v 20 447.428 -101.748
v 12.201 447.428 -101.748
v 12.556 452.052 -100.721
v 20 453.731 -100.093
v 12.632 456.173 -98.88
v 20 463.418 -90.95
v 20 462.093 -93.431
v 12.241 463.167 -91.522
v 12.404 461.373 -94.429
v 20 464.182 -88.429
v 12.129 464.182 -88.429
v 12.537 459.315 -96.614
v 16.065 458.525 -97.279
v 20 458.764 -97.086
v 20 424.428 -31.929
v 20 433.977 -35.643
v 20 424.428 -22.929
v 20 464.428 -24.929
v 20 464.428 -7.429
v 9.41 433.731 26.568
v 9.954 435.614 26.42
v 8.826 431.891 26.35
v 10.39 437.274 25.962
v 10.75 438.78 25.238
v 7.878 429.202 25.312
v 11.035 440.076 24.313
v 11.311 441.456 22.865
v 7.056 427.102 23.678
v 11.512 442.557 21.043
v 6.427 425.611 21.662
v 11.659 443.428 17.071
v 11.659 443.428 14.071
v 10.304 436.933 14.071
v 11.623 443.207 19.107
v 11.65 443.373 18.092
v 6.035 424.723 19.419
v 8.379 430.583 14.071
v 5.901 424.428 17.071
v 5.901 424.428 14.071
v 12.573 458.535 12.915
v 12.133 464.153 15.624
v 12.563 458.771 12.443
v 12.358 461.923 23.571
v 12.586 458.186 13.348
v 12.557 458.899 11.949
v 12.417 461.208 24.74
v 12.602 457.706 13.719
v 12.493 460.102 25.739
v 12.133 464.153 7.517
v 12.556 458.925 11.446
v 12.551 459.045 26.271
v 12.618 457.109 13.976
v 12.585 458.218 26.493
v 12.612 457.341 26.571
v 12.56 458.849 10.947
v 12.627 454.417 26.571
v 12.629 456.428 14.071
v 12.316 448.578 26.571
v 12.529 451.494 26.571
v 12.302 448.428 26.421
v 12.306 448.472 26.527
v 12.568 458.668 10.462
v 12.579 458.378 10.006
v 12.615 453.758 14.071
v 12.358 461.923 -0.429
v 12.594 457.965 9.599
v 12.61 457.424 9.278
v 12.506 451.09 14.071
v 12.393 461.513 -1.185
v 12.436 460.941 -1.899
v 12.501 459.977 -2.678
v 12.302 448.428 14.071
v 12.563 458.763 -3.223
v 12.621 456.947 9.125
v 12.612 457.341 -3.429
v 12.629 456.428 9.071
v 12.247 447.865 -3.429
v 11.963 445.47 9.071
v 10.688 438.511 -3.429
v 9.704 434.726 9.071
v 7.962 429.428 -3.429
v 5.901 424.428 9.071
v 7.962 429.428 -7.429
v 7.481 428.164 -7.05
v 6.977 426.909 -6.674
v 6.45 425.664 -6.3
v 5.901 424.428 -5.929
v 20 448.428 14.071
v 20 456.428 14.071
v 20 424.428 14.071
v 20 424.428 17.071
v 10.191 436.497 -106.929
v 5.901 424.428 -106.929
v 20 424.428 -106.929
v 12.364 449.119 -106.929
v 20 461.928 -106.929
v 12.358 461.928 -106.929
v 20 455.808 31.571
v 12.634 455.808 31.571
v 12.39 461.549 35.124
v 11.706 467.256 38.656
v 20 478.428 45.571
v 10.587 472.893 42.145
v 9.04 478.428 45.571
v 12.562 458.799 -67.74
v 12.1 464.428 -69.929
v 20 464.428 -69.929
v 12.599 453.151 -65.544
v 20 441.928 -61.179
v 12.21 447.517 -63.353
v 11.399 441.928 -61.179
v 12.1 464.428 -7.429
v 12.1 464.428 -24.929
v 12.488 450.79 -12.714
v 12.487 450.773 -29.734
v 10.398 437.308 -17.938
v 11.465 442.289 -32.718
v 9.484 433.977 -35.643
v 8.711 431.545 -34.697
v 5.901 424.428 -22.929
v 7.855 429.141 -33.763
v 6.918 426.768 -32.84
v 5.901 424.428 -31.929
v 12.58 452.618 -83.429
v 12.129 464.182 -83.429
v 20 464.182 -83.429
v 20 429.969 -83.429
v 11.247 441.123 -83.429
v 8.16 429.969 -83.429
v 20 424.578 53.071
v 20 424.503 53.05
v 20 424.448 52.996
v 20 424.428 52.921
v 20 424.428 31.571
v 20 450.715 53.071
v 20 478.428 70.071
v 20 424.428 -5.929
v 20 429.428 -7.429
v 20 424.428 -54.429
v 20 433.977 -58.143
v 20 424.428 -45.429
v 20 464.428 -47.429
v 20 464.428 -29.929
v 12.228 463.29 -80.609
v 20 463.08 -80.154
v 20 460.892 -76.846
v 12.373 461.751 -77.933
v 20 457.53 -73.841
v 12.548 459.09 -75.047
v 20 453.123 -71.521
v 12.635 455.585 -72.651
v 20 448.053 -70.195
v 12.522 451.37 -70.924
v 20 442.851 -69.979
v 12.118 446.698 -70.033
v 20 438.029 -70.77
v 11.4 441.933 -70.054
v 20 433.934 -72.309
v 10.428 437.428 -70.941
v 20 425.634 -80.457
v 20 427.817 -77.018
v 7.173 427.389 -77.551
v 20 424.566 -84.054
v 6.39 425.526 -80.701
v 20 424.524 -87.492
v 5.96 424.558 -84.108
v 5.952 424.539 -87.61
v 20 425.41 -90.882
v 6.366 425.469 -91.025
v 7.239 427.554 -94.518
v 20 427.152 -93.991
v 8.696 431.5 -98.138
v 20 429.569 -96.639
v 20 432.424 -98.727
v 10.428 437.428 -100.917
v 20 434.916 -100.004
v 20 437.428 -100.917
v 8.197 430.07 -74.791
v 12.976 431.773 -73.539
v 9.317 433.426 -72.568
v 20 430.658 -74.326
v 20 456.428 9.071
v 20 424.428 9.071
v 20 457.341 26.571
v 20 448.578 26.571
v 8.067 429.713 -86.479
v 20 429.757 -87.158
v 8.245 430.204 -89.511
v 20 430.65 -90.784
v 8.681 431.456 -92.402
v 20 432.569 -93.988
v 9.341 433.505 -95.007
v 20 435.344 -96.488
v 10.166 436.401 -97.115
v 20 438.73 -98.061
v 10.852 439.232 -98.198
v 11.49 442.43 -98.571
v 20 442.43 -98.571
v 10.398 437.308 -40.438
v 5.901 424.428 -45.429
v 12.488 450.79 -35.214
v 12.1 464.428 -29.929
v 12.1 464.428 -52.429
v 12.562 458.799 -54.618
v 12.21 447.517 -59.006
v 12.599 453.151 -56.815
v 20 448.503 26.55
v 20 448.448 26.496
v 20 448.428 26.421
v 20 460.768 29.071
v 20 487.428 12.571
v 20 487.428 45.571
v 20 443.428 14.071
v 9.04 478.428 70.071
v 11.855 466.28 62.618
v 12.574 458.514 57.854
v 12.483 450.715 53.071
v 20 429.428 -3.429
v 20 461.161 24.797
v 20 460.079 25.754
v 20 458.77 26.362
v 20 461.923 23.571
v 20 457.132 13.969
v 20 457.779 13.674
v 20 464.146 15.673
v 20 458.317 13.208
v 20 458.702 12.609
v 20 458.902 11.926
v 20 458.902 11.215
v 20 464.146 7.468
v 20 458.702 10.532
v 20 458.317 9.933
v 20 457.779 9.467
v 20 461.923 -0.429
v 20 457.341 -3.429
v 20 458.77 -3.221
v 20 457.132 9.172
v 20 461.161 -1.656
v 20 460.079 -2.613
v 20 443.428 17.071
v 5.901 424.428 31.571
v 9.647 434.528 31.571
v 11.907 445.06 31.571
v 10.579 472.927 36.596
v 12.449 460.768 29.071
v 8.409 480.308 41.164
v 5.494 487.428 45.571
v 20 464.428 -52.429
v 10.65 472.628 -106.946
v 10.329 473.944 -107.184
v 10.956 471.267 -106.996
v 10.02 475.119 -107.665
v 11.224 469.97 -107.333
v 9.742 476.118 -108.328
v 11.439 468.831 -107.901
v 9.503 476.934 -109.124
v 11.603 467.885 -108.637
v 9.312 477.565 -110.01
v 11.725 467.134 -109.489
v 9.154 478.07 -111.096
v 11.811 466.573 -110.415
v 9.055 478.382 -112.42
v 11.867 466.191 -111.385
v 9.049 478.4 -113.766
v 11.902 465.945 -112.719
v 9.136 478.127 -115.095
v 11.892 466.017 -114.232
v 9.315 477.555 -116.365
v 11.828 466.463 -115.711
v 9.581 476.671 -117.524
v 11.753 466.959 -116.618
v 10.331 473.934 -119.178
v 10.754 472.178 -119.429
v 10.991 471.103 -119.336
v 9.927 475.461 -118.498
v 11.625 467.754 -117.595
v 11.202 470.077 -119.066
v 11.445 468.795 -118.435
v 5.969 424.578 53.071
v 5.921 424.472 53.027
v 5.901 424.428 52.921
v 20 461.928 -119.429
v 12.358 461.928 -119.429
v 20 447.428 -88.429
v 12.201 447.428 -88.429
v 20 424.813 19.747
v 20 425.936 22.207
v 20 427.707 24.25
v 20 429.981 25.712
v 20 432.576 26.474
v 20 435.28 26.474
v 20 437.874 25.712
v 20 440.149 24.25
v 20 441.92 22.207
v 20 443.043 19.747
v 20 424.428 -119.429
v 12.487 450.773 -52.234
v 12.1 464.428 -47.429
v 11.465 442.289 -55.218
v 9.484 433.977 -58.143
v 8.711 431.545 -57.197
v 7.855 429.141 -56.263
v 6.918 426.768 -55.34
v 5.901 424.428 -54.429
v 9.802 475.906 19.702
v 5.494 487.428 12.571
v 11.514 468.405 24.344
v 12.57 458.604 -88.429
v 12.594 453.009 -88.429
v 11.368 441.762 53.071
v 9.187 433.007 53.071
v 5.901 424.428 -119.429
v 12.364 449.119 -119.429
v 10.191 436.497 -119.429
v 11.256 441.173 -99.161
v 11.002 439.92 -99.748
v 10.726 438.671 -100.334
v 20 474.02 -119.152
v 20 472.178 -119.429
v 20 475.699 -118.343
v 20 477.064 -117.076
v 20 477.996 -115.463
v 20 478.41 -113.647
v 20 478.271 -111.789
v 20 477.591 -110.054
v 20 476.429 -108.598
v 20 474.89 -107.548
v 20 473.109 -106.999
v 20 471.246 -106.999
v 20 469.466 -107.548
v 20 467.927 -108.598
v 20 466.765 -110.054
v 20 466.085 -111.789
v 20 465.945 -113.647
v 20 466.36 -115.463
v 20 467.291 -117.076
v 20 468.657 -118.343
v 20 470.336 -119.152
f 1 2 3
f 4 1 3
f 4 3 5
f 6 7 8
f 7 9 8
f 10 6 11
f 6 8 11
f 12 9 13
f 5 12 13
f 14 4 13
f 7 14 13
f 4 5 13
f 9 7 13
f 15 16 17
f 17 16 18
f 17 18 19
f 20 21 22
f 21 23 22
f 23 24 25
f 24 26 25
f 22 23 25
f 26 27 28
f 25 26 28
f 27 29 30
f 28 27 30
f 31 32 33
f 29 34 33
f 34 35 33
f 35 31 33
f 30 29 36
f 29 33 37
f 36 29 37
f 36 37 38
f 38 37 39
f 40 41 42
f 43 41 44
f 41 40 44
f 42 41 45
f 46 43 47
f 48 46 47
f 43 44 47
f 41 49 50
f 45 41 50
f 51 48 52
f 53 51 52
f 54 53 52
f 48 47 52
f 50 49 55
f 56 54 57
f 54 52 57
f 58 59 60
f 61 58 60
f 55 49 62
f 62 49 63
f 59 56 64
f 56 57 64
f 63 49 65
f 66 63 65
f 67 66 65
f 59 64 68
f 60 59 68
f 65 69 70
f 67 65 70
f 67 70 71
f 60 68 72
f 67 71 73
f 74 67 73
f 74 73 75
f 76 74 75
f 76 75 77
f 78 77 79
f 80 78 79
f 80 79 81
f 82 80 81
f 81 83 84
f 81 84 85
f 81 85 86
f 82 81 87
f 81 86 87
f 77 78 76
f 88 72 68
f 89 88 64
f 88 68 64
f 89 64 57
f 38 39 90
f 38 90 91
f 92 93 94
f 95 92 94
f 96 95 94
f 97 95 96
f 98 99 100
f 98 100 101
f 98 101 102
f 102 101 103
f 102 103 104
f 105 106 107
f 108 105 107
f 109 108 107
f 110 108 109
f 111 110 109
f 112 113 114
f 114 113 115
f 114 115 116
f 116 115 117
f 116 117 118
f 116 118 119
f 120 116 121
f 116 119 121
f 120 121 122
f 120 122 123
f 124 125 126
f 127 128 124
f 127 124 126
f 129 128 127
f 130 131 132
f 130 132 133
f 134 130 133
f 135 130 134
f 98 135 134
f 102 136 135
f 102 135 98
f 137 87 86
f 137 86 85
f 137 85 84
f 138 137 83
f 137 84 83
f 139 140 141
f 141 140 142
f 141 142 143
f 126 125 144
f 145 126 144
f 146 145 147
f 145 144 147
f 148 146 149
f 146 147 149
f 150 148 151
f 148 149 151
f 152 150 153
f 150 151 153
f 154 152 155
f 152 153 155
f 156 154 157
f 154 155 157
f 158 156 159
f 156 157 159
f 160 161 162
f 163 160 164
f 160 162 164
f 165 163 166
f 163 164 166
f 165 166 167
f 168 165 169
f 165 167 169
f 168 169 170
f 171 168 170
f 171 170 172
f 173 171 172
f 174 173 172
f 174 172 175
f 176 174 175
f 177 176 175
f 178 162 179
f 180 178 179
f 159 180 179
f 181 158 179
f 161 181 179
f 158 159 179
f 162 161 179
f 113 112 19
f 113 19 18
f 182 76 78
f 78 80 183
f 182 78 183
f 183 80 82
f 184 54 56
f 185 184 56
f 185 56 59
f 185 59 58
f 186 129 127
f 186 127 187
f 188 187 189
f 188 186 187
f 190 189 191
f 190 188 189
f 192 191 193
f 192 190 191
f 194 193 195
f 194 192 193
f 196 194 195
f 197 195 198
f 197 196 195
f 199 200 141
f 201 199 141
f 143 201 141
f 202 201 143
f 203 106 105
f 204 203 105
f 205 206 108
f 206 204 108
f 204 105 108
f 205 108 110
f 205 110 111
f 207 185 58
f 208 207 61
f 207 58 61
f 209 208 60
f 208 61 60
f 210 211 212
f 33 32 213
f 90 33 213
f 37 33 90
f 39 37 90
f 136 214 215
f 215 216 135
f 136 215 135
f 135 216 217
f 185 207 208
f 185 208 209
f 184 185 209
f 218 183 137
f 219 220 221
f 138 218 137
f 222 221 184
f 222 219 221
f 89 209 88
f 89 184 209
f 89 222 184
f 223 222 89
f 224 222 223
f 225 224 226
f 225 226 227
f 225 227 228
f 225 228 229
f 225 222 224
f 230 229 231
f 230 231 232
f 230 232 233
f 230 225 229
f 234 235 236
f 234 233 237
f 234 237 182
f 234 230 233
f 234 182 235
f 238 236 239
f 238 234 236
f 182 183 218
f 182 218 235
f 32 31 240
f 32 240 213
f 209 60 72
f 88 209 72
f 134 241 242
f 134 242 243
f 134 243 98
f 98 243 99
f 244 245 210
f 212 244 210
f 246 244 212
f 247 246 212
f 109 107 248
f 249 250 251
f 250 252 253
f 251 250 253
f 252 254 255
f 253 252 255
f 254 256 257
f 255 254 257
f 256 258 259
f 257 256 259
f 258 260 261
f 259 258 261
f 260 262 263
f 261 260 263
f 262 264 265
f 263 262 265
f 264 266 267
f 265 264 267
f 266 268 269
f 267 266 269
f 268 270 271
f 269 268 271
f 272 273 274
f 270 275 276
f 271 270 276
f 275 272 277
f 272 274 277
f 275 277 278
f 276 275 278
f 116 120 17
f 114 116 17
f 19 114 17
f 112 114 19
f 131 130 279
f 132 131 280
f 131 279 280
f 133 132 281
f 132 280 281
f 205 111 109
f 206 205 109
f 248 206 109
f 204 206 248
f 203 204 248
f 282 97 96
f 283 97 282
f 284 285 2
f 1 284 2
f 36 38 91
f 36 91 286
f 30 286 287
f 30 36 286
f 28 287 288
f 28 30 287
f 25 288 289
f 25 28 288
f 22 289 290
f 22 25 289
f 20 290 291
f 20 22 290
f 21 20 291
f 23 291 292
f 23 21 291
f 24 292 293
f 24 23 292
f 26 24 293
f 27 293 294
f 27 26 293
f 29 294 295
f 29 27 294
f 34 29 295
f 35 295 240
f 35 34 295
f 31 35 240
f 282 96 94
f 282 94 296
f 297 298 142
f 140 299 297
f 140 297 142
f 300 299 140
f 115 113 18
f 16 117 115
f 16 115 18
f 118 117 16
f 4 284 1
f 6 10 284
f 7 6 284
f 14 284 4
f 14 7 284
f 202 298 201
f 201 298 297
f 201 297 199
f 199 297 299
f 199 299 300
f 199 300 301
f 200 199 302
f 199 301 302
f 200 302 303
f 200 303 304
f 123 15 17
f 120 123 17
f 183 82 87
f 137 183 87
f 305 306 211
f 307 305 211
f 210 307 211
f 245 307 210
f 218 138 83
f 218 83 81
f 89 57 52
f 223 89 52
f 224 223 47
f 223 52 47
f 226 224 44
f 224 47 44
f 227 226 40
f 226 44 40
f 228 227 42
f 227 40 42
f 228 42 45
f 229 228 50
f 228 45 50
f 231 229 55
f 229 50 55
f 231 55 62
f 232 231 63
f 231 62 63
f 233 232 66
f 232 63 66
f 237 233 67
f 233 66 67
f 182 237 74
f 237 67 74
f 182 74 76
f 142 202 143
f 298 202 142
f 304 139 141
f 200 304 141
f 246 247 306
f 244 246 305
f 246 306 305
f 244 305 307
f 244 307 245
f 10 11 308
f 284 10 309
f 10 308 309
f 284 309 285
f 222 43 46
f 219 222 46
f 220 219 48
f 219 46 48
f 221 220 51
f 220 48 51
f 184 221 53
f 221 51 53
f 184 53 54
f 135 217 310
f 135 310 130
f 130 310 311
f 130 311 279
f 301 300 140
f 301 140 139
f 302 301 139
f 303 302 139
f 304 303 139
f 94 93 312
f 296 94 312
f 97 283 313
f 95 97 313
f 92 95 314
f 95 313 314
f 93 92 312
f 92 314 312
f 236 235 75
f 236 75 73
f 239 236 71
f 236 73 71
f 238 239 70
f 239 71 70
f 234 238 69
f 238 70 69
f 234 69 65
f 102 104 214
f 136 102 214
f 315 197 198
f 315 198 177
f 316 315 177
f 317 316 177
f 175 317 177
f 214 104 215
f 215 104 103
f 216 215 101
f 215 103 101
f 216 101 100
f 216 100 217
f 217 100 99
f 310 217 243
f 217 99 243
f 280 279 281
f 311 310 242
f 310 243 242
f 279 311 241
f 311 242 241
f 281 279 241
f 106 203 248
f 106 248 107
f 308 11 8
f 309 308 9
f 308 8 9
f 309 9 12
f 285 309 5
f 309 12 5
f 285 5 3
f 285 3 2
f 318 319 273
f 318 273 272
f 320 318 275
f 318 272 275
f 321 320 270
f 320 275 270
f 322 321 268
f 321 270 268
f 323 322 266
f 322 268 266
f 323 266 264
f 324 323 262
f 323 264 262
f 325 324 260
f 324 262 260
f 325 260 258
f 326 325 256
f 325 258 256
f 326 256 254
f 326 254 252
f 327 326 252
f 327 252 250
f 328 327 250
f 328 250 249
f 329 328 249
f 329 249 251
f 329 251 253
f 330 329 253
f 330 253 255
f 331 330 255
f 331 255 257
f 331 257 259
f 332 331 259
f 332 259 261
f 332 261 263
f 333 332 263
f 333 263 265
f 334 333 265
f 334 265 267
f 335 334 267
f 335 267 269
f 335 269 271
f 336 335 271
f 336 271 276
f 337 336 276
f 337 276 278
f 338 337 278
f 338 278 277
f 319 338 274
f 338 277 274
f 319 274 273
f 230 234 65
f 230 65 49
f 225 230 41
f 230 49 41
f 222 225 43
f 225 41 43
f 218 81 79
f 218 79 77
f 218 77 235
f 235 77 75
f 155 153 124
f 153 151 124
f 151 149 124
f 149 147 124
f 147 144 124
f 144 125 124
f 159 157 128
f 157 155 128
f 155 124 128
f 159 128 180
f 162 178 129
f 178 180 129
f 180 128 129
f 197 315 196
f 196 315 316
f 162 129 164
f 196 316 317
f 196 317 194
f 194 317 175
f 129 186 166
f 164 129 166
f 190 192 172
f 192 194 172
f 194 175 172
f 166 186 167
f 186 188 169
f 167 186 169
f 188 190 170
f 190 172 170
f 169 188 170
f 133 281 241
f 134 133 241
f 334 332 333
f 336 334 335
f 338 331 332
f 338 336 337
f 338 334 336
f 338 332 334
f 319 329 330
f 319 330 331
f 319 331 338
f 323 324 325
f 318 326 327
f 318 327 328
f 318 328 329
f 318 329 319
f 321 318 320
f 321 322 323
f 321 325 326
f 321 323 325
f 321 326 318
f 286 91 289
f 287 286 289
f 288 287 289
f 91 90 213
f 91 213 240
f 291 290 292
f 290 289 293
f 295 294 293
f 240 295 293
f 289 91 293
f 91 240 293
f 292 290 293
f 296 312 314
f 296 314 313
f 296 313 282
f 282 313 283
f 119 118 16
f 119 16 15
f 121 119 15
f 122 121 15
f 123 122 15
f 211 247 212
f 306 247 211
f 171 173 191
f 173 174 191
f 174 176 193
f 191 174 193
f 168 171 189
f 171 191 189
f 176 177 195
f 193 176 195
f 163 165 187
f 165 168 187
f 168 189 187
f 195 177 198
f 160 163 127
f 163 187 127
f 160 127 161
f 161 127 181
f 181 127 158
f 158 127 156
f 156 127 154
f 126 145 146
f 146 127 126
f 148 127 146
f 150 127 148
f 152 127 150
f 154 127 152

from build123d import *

# Parameters (mm, degrees)
EXTRUDE_1_DEPTH     = 20
EXTRUDE_1_2_DEPTH   = 20
EXTRUDE_1_3_DEPTH   = 20
SKETCH_2_W          = 12.5
SKETCH_2_H          = 37.5
EXTRUDE_1_4_DEPTH   = 20
EXTRUDE_1_5_DEPTH   = 20
EXTRUDE_1_6_DEPTH   = 20
EXTRUDE_1_7_DEPTH   = 20
EXTRUDE_1_8_DEPTH   = 20
EXTRUDE_1_9_DEPTH   = 20
SKETCH_2_R          = 6.25
EXTRUDE_1_10_DEPTH  = 20
EXTRUDE_2_DEPTH     = 20
SKETCH_4_R          = 75
CUT_EXTRUDE_2_DEPTH = 524.350910285


with BuildPart() as part:
    # 草图2 → 凸台-拉伸1 (new body)
    with BuildSketch(Plane(origin=(0, 0, 0), x_dir=(0, 0, -1), z_dir=(1, 0, 0))):
        with BuildLine():
            Line((5.929490869, 424.427866758), (7.429490869, 429.427866758))
            Line((7.429490869, 429.427866758), (3.429490869, 429.427866758))
            Line((3.429490869, 429.427866758), (3.429490869, 457.340745232))
            ThreePointArc((3.429490869, 457.340745232), (2.612791001, 460.07935802), (0.429490869, 461.923320927))
            ThreePointArc((0.429490869, 461.923320927), (-11.570509131, 464.427866758), (-23.570509131, 461.923320927))
            ThreePointArc((-23.570509131, 461.923320927), (-25.753809264, 460.07935802), (-26.570509131, 457.340745232))
            Line((-26.570509131, 457.340745232), (-26.570509131, 448.577866758))
            ThreePointArc((-26.570509131, 448.577866758), (-26.526575148, 448.47180074), (-26.420509131, 448.427866758))
            Line((-26.420509131, 448.427866758), (-14.070509131, 448.427866758))
            Line((-14.070509131, 448.427866758), (-14.070509131, 456.427866758))
            ThreePointArc((-14.070509131, 456.427866758), (-11.570509131, 458.927866758), (-9.070509131, 456.427866758))
            Line((-9.070509131, 456.427866758), (-9.070509131, 424.427866758))
            Line((-9.070509131, 424.427866758), (5.929490869, 424.427866758))
        make_face()
    extrude(amount=EXTRUDE_1_DEPTH)


with BuildPart() as body_2:
    # 草图2 → Extrude 1 2 (new body)
    with BuildSketch(Plane(origin=(0, 0, 0), x_dir=(0, 0, -1), z_dir=(1, 0, 0))):
        with BuildLine():
            Line((-70.070509131, 478.427866758), (-53.070509131, 450.715053837))
            Line((-53.070509131, 450.715053837), (-53.070509131, 424.577866758))
            ThreePointArc((-53.070509131, 424.577866758), (-53.026575148, 424.47180074), (-52.920509131, 424.427866758))
            Line((-52.920509131, 424.427866758), (-31.570509131, 424.427866758))
            Line((-31.570509131, 424.427866758), (-31.570509131, 455.807548639))
            Line((-31.570509131, 455.807548639), (-45.570509131, 478.427866758))
            Line((-45.570509131, 478.427866758), (-70.070509131, 478.427866758))
        make_face()
    extrude(amount=EXTRUDE_1_2_DEPTH)


with BuildPart() as body_3:
    # 草图2 → Extrude 1 3 (new body)
    with BuildSketch(Plane(origin=(0, 0, 0), x_dir=(0, 0, -1), z_dir=(1, 0, 0))):
        with BuildLine():
            Line((-14.070509131, 424.427866758), (-14.070509131, 443.427866758))
            Line((-14.070509131, 443.427866758), (-17.070509131, 443.427866758))
            ThreePointArc((-17.070509131, 443.427866758), (-26.570509131, 433.927866758), (-17.070509131, 424.427866758))
            Line((-17.070509131, 424.427866758), (-14.070509131, 424.427866758))
        make_face()
    extrude(amount=EXTRUDE_1_3_DEPTH)


with BuildPart() as body_4:
    # 草图2 → Extrude 1 4 (new body)
    with BuildSketch(Plane(origin=(0, 0, 0), x_dir=(0, 0, -1), z_dir=(1, 0, 0))):
        with Locations((113.179490869, 443.177866758)):
            Rectangle(SKETCH_2_W, SKETCH_2_H)
    extrude(amount=EXTRUDE_1_4_DEPTH)


with BuildPart() as body_5:
    # 草图2 → Extrude 1 5 (new body)
    with BuildSketch(Plane(origin=(0, 0, 0), x_dir=(0, 0, -1), z_dir=(1, 0, 0))):
        Polygon((54.429490869, 424.427866758), (58.142941161, 433.976738938), (47.429490869, 464.427866758), (29.929490869, 464.427866758), (45.429490869, 424.427866758), align=None)
    extrude(amount=EXTRUDE_1_5_DEPTH)


with BuildPart() as body_6:
    # 草图2 → Extrude 1 6 (new body)
    with BuildSketch(Plane(origin=(0, 0, 0), x_dir=(0, 0, -1), z_dir=(1, 0, 0))):
        Polygon((31.929490869, 424.427866758), (35.642941161, 433.976738938), (24.929490869, 464.427866758), (7.429490869, 464.427866758), (22.929490869, 424.427866758), align=None)
    extrude(amount=EXTRUDE_1_6_DEPTH)


with BuildPart() as body_7:
    # 草图2 → Extrude 1 7 (new body)
    with BuildSketch(Plane(origin=(0, 0, 0), x_dir=(0, 0, -1), z_dir=(1, 0, 0))):
        Polygon((69.929490869, 464.427866758), (52.429490869, 464.427866758), (61.179490869, 441.927866758), align=None)
    extrude(amount=EXTRUDE_1_7_DEPTH)


with BuildPart() as body_8:
    # 草图2 → Extrude 1 8 (new body)
    with BuildSketch(Plane(origin=(0, 0, 0), x_dir=(0, 0, -1), z_dir=(1, 0, 0))):
        with BuildLine():
            add(Edge.make_bspline(
                [(101.748466815, 447.427866758), (99.992454165, 461.895742739), (88.429490869, 464.182217544)],
                knots=[4.862957253, 4.862957253, 4.862957253, 6.126292436, 6.126292436, 6.126292436], degree=2, weights=[1, 0.807043932, 1]))
            Line((88.429490869, 464.182217544), (88.429490869, 447.427866758))
            Line((88.429490869, 447.427866758), (101.748466815, 447.427866758))
        make_face()
    extrude(amount=EXTRUDE_1_8_DEPTH)


with BuildPart() as body_9:
    # 草图2 → Extrude 1 9 (new body)
    with BuildSketch(Plane(origin=(0, 0, 0), x_dir=(0, 0, -1), z_dir=(1, 0, 0))):
        with BuildLine():
            Line((83.429490869, 429.969357426), (83.429490869, 464.182217544))
            add(Edge.make_bspline(
                [(83.429490869, 464.182217544), (55.912124292, 458.740899105), (73.539383857, 431.773492006), (91.166643422, 404.806084906), (100.917486065, 437.427866758)],
                knots=[0.156892871, 0.156892871, 0.156892871, 2.255855374, 2.255855374, 4.354817877, 4.354817877, 4.354817877], degree=2, weights=[1, 0.498020955, 1, 0.498020955, 1]))
            Line((100.917486065, 437.427866758), (98.570833336, 442.429980403))
            ThreePointArc((98.570833336, 442.429980403), (93.988389037, 432.568568972), (83.429490869, 429.969357426))
        make_face()
    extrude(amount=EXTRUDE_1_9_DEPTH)


with BuildPart() as body_10:
    # 草图2 → Extrude 1 10 (new body)
    with BuildSketch(Plane(origin=(0, 0, 0), x_dir=(0, 0, -1), z_dir=(1, 0, 0))):
        with Locations((113.179490869, 472.177866758)):
            Circle(SKETCH_2_R)
    extrude(amount=EXTRUDE_1_10_DEPTH)


with BuildPart() as body_11:
    # 草图2<3> → 凸台-拉伸2 (new body)
    with BuildSketch(Plane(origin=(0, 0, 0), x_dir=(0, 0, -1), z_dir=(1, 0, 0))):
        Polygon((-12.570509131, 487.427866758), (-45.570509131, 487.427866758), (-29.070509131, 460.768206118), align=None)
    extrude(amount=EXTRUDE_2_DEPTH)


with BuildPart() as cut_extrude_2_tool:
    # 草图4 → 切除-拉伸2 (new, through all)
    with BuildSketch(Plane(origin=(0, 0, -119.429490869), x_dir=(-1, 0, 0), z_dir=(0, 0, -1))):
        with Locations((62.364974001, 455.487511946)):
            Circle(SKETCH_4_R)
    extrude(amount=-CUT_EXTRUDE_2_DEPTH)


with BuildPart() as part_1:
    add(part.part)

    # 切除-拉伸2: cut by cut_extrude_2_tool
    add(cut_extrude_2_tool.part, mode=Mode.SUBTRACT)


with BuildPart() as body_2_1:
    add(body_2.part)

    # 切除-拉伸2: cut by cut_extrude_2_tool
    add(cut_extrude_2_tool.part, mode=Mode.SUBTRACT)


with BuildPart() as body_3_1:
    add(body_3.part)

    # 切除-拉伸2: cut by cut_extrude_2_tool
    add(cut_extrude_2_tool.part, mode=Mode.SUBTRACT)


with BuildPart() as body_4_1:
    add(body_4.part)

    # 切除-拉伸2: cut by cut_extrude_2_tool
    add(cut_extrude_2_tool.part, mode=Mode.SUBTRACT)


with BuildPart() as body_5_1:
    add(body_5.part)

    # 切除-拉伸2: cut by cut_extrude_2_tool
    add(cut_extrude_2_tool.part, mode=Mode.SUBTRACT)


with BuildPart() as body_6_1:
    add(body_6.part)

    # 切除-拉伸2: cut by cut_extrude_2_tool
    add(cut_extrude_2_tool.part, mode=Mode.SUBTRACT)


with BuildPart() as body_7_1:
    add(body_7.part)

    # 切除-拉伸2: cut by cut_extrude_2_tool
    add(cut_extrude_2_tool.part, mode=Mode.SUBTRACT)


with BuildPart() as body_8_1:
    add(body_8.part)

    # 切除-拉伸2: cut by cut_extrude_2_tool
    add(cut_extrude_2_tool.part, mode=Mode.SUBTRACT)


with BuildPart() as body_9_1:
    add(body_9.part)

    # 切除-拉伸2: cut by cut_extrude_2_tool
    add(cut_extrude_2_tool.part, mode=Mode.SUBTRACT)


with BuildPart() as body_10_1:
    add(body_10.part)

    # 切除-拉伸2: cut by cut_extrude_2_tool
    add(cut_extrude_2_tool.part, mode=Mode.SUBTRACT)


with BuildPart() as body_11_1:
    add(body_11.part)

    # 切除-拉伸2: cut by cut_extrude_2_tool
    add(cut_extrude_2_tool.part, mode=Mode.SUBTRACT)


solid = Compound([part_1.part, body_2_1.part, body_3_1.part, body_4_1.part, body_5_1.part, body_6_1.part, body_7_1.part, body_8_1.part, body_9_1.part, body_10_1.part, body_11_1.part])
